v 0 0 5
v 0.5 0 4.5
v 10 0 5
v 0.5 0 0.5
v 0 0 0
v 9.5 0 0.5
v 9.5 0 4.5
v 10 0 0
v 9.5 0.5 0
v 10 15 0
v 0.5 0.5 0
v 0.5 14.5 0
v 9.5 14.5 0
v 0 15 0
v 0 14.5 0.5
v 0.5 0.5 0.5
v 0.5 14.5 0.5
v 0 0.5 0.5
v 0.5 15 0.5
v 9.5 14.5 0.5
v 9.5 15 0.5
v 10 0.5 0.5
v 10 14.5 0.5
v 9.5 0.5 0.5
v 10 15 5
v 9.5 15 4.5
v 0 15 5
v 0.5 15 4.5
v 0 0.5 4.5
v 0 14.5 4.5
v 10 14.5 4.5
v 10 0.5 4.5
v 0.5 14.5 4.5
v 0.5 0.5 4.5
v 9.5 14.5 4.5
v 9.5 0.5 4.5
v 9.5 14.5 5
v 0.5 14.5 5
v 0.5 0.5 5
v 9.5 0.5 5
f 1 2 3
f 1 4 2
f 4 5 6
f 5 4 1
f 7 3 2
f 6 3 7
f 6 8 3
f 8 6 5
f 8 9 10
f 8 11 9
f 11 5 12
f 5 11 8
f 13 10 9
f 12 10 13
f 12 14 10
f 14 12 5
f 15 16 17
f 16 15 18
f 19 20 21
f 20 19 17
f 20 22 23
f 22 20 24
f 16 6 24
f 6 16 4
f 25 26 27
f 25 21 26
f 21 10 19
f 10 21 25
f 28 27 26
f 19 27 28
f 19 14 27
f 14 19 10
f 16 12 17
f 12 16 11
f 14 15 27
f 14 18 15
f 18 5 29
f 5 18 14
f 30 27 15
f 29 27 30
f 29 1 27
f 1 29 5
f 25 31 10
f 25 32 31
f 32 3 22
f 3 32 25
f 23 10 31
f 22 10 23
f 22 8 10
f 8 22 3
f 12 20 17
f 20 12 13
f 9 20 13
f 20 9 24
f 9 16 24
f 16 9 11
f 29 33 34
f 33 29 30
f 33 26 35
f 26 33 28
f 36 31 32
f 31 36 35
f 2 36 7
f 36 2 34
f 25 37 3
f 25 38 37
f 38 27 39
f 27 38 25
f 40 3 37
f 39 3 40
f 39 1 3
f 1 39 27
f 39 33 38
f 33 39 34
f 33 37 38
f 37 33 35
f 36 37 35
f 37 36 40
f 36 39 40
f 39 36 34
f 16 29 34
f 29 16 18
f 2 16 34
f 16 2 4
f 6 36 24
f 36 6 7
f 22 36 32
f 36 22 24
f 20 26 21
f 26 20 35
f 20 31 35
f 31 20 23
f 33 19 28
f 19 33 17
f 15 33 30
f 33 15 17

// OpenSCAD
$fn=7;
union()
{
	union()
	{
		hull()
		{
			translate([0,0,0])
			{
				rotate(0,[0,0,1])
				{
					cube([0.5,0.5,0.5]);
				}
			}
			translate([0,14.5,0])
			{
				rotate(0,[0,0,1])
				{
					cube([0.5,0.5,0.5]);
				}
			}
		}
		hull()
		{
			translate([0,14.5,0])
			{
				rotate(0,[0,0,1])
				{
					cube([0.5,0.5,0.5]);
				}
			}
			translate([9.5,14.5,0])
			{
				rotate(0,[0,0,1])
				{
					cube([0.5,0.5,0.5]);
				}
			}
		}
		hull()
		{
			translate([9.5,14.5,0])
			{
				rotate(0,[0,0,1])
				{
					cube([0.5,0.5,0.5]);
				}
			}
			translate([9.5,0,0])
			{
				rotate(0,[0,0,1])
				{
					cube([0.5,0.5,0.5]);
				}
			}
		}
		hull()
		{
			translate([9.5,0,0])
			{
				rotate(0,[0,0,1])
				{
					cube([0.5,0.5,0.5]);
				}
			}
			translate([0,0,0])
			{
				rotate(0,[0,0,1])
				{
					cube([0.5,0.5,0.5]);
				}
			}
		}
	}
	union()
	{
		hull()
		{
			translate([0,0,4.5])
			{
				rotate(0,[0,0,1])
				{
					cube([0.5,0.5,0.5]);
				}
			}
			translate([0,14.5,4.5])
			{
				rotate(0,[0,0,1])
				{
					cube([0.5,0.5,0.5]);
				}
			}
		}
		hull()
		{
			translate([0,14.5,4.5])
			{
				rotate(0,[0,0,1])
				{
					cube([0.5,0.5,0.5]);
				}
			}
			translate([9.5,14.5,4.5])
			{
				rotate(0,[0,0,1])
				{
					cube([0.5,0.5,0.5]);
				}
			}
		}
		hull()
		{
			translate([9.5,14.5,4.5])
			{
				rotate(0,[0,0,1])
				{
					cube([0.5,0.5,0.5]);
				}
			}
			translate([9.5,0,4.5])
			{
				rotate(0,[0,0,1])
				{
					cube([0.5,0.5,0.5]);
				}
			}
		}
		hull()
		{
			translate([9.5,0,4.5])
			{
				rotate(0,[0,0,1])
				{
					cube([0.5,0.5,0.5]);
				}
			}
			translate([0,0,4.5])
			{
				rotate(0,[0,0,1])
				{
					cube([0.5,0.5,0.5]);
				}
			}
		}
	}
	hull()
	{
		translate([0,0,0])
		{
			rotate(0,[0,0,1])
			{
				cube([0.5,0.5,0.5]);
			}
		}
		translate([0,0,4.5])
		{
			rotate(0,[0,0,1])
			{
				cube([0.5,0.5,0.5]);
			}
		}
	}
	hull()
	{
		translate([9.5,0,0])
		{
			rotate(0,[0,0,1])
			{
				cube([0.5,0.5,0.5]);
			}
		}
		translate([9.5,0,4.5])
		{
			rotate(0,[0,0,1])
			{
				cube([0.5,0.5,0.5]);
			}
		}
	}
	hull()
	{
		translate([9.5,14.5,0])
		{
			rotate(0,[0,0,1])
			{
				cube([0.5,0.5,0.5]);
			}
		}
		translate([9.5,14.5,4.5])
		{
			rotate(0,[0,0,1])
			{
				cube([0.5,0.5,0.5]);
			}
		}
	}
	hull()
	{
		translate([0,14.5,0])
		{
			rotate(0,[0,0,1])
			{
				cube([0.5,0.5,0.5]);
			}
		}
		translate([0,14.5,4.5])
		{
			rotate(0,[0,0,1])
			{
				cube([0.5,0.5,0.5]);
			}
		}
	}
}
